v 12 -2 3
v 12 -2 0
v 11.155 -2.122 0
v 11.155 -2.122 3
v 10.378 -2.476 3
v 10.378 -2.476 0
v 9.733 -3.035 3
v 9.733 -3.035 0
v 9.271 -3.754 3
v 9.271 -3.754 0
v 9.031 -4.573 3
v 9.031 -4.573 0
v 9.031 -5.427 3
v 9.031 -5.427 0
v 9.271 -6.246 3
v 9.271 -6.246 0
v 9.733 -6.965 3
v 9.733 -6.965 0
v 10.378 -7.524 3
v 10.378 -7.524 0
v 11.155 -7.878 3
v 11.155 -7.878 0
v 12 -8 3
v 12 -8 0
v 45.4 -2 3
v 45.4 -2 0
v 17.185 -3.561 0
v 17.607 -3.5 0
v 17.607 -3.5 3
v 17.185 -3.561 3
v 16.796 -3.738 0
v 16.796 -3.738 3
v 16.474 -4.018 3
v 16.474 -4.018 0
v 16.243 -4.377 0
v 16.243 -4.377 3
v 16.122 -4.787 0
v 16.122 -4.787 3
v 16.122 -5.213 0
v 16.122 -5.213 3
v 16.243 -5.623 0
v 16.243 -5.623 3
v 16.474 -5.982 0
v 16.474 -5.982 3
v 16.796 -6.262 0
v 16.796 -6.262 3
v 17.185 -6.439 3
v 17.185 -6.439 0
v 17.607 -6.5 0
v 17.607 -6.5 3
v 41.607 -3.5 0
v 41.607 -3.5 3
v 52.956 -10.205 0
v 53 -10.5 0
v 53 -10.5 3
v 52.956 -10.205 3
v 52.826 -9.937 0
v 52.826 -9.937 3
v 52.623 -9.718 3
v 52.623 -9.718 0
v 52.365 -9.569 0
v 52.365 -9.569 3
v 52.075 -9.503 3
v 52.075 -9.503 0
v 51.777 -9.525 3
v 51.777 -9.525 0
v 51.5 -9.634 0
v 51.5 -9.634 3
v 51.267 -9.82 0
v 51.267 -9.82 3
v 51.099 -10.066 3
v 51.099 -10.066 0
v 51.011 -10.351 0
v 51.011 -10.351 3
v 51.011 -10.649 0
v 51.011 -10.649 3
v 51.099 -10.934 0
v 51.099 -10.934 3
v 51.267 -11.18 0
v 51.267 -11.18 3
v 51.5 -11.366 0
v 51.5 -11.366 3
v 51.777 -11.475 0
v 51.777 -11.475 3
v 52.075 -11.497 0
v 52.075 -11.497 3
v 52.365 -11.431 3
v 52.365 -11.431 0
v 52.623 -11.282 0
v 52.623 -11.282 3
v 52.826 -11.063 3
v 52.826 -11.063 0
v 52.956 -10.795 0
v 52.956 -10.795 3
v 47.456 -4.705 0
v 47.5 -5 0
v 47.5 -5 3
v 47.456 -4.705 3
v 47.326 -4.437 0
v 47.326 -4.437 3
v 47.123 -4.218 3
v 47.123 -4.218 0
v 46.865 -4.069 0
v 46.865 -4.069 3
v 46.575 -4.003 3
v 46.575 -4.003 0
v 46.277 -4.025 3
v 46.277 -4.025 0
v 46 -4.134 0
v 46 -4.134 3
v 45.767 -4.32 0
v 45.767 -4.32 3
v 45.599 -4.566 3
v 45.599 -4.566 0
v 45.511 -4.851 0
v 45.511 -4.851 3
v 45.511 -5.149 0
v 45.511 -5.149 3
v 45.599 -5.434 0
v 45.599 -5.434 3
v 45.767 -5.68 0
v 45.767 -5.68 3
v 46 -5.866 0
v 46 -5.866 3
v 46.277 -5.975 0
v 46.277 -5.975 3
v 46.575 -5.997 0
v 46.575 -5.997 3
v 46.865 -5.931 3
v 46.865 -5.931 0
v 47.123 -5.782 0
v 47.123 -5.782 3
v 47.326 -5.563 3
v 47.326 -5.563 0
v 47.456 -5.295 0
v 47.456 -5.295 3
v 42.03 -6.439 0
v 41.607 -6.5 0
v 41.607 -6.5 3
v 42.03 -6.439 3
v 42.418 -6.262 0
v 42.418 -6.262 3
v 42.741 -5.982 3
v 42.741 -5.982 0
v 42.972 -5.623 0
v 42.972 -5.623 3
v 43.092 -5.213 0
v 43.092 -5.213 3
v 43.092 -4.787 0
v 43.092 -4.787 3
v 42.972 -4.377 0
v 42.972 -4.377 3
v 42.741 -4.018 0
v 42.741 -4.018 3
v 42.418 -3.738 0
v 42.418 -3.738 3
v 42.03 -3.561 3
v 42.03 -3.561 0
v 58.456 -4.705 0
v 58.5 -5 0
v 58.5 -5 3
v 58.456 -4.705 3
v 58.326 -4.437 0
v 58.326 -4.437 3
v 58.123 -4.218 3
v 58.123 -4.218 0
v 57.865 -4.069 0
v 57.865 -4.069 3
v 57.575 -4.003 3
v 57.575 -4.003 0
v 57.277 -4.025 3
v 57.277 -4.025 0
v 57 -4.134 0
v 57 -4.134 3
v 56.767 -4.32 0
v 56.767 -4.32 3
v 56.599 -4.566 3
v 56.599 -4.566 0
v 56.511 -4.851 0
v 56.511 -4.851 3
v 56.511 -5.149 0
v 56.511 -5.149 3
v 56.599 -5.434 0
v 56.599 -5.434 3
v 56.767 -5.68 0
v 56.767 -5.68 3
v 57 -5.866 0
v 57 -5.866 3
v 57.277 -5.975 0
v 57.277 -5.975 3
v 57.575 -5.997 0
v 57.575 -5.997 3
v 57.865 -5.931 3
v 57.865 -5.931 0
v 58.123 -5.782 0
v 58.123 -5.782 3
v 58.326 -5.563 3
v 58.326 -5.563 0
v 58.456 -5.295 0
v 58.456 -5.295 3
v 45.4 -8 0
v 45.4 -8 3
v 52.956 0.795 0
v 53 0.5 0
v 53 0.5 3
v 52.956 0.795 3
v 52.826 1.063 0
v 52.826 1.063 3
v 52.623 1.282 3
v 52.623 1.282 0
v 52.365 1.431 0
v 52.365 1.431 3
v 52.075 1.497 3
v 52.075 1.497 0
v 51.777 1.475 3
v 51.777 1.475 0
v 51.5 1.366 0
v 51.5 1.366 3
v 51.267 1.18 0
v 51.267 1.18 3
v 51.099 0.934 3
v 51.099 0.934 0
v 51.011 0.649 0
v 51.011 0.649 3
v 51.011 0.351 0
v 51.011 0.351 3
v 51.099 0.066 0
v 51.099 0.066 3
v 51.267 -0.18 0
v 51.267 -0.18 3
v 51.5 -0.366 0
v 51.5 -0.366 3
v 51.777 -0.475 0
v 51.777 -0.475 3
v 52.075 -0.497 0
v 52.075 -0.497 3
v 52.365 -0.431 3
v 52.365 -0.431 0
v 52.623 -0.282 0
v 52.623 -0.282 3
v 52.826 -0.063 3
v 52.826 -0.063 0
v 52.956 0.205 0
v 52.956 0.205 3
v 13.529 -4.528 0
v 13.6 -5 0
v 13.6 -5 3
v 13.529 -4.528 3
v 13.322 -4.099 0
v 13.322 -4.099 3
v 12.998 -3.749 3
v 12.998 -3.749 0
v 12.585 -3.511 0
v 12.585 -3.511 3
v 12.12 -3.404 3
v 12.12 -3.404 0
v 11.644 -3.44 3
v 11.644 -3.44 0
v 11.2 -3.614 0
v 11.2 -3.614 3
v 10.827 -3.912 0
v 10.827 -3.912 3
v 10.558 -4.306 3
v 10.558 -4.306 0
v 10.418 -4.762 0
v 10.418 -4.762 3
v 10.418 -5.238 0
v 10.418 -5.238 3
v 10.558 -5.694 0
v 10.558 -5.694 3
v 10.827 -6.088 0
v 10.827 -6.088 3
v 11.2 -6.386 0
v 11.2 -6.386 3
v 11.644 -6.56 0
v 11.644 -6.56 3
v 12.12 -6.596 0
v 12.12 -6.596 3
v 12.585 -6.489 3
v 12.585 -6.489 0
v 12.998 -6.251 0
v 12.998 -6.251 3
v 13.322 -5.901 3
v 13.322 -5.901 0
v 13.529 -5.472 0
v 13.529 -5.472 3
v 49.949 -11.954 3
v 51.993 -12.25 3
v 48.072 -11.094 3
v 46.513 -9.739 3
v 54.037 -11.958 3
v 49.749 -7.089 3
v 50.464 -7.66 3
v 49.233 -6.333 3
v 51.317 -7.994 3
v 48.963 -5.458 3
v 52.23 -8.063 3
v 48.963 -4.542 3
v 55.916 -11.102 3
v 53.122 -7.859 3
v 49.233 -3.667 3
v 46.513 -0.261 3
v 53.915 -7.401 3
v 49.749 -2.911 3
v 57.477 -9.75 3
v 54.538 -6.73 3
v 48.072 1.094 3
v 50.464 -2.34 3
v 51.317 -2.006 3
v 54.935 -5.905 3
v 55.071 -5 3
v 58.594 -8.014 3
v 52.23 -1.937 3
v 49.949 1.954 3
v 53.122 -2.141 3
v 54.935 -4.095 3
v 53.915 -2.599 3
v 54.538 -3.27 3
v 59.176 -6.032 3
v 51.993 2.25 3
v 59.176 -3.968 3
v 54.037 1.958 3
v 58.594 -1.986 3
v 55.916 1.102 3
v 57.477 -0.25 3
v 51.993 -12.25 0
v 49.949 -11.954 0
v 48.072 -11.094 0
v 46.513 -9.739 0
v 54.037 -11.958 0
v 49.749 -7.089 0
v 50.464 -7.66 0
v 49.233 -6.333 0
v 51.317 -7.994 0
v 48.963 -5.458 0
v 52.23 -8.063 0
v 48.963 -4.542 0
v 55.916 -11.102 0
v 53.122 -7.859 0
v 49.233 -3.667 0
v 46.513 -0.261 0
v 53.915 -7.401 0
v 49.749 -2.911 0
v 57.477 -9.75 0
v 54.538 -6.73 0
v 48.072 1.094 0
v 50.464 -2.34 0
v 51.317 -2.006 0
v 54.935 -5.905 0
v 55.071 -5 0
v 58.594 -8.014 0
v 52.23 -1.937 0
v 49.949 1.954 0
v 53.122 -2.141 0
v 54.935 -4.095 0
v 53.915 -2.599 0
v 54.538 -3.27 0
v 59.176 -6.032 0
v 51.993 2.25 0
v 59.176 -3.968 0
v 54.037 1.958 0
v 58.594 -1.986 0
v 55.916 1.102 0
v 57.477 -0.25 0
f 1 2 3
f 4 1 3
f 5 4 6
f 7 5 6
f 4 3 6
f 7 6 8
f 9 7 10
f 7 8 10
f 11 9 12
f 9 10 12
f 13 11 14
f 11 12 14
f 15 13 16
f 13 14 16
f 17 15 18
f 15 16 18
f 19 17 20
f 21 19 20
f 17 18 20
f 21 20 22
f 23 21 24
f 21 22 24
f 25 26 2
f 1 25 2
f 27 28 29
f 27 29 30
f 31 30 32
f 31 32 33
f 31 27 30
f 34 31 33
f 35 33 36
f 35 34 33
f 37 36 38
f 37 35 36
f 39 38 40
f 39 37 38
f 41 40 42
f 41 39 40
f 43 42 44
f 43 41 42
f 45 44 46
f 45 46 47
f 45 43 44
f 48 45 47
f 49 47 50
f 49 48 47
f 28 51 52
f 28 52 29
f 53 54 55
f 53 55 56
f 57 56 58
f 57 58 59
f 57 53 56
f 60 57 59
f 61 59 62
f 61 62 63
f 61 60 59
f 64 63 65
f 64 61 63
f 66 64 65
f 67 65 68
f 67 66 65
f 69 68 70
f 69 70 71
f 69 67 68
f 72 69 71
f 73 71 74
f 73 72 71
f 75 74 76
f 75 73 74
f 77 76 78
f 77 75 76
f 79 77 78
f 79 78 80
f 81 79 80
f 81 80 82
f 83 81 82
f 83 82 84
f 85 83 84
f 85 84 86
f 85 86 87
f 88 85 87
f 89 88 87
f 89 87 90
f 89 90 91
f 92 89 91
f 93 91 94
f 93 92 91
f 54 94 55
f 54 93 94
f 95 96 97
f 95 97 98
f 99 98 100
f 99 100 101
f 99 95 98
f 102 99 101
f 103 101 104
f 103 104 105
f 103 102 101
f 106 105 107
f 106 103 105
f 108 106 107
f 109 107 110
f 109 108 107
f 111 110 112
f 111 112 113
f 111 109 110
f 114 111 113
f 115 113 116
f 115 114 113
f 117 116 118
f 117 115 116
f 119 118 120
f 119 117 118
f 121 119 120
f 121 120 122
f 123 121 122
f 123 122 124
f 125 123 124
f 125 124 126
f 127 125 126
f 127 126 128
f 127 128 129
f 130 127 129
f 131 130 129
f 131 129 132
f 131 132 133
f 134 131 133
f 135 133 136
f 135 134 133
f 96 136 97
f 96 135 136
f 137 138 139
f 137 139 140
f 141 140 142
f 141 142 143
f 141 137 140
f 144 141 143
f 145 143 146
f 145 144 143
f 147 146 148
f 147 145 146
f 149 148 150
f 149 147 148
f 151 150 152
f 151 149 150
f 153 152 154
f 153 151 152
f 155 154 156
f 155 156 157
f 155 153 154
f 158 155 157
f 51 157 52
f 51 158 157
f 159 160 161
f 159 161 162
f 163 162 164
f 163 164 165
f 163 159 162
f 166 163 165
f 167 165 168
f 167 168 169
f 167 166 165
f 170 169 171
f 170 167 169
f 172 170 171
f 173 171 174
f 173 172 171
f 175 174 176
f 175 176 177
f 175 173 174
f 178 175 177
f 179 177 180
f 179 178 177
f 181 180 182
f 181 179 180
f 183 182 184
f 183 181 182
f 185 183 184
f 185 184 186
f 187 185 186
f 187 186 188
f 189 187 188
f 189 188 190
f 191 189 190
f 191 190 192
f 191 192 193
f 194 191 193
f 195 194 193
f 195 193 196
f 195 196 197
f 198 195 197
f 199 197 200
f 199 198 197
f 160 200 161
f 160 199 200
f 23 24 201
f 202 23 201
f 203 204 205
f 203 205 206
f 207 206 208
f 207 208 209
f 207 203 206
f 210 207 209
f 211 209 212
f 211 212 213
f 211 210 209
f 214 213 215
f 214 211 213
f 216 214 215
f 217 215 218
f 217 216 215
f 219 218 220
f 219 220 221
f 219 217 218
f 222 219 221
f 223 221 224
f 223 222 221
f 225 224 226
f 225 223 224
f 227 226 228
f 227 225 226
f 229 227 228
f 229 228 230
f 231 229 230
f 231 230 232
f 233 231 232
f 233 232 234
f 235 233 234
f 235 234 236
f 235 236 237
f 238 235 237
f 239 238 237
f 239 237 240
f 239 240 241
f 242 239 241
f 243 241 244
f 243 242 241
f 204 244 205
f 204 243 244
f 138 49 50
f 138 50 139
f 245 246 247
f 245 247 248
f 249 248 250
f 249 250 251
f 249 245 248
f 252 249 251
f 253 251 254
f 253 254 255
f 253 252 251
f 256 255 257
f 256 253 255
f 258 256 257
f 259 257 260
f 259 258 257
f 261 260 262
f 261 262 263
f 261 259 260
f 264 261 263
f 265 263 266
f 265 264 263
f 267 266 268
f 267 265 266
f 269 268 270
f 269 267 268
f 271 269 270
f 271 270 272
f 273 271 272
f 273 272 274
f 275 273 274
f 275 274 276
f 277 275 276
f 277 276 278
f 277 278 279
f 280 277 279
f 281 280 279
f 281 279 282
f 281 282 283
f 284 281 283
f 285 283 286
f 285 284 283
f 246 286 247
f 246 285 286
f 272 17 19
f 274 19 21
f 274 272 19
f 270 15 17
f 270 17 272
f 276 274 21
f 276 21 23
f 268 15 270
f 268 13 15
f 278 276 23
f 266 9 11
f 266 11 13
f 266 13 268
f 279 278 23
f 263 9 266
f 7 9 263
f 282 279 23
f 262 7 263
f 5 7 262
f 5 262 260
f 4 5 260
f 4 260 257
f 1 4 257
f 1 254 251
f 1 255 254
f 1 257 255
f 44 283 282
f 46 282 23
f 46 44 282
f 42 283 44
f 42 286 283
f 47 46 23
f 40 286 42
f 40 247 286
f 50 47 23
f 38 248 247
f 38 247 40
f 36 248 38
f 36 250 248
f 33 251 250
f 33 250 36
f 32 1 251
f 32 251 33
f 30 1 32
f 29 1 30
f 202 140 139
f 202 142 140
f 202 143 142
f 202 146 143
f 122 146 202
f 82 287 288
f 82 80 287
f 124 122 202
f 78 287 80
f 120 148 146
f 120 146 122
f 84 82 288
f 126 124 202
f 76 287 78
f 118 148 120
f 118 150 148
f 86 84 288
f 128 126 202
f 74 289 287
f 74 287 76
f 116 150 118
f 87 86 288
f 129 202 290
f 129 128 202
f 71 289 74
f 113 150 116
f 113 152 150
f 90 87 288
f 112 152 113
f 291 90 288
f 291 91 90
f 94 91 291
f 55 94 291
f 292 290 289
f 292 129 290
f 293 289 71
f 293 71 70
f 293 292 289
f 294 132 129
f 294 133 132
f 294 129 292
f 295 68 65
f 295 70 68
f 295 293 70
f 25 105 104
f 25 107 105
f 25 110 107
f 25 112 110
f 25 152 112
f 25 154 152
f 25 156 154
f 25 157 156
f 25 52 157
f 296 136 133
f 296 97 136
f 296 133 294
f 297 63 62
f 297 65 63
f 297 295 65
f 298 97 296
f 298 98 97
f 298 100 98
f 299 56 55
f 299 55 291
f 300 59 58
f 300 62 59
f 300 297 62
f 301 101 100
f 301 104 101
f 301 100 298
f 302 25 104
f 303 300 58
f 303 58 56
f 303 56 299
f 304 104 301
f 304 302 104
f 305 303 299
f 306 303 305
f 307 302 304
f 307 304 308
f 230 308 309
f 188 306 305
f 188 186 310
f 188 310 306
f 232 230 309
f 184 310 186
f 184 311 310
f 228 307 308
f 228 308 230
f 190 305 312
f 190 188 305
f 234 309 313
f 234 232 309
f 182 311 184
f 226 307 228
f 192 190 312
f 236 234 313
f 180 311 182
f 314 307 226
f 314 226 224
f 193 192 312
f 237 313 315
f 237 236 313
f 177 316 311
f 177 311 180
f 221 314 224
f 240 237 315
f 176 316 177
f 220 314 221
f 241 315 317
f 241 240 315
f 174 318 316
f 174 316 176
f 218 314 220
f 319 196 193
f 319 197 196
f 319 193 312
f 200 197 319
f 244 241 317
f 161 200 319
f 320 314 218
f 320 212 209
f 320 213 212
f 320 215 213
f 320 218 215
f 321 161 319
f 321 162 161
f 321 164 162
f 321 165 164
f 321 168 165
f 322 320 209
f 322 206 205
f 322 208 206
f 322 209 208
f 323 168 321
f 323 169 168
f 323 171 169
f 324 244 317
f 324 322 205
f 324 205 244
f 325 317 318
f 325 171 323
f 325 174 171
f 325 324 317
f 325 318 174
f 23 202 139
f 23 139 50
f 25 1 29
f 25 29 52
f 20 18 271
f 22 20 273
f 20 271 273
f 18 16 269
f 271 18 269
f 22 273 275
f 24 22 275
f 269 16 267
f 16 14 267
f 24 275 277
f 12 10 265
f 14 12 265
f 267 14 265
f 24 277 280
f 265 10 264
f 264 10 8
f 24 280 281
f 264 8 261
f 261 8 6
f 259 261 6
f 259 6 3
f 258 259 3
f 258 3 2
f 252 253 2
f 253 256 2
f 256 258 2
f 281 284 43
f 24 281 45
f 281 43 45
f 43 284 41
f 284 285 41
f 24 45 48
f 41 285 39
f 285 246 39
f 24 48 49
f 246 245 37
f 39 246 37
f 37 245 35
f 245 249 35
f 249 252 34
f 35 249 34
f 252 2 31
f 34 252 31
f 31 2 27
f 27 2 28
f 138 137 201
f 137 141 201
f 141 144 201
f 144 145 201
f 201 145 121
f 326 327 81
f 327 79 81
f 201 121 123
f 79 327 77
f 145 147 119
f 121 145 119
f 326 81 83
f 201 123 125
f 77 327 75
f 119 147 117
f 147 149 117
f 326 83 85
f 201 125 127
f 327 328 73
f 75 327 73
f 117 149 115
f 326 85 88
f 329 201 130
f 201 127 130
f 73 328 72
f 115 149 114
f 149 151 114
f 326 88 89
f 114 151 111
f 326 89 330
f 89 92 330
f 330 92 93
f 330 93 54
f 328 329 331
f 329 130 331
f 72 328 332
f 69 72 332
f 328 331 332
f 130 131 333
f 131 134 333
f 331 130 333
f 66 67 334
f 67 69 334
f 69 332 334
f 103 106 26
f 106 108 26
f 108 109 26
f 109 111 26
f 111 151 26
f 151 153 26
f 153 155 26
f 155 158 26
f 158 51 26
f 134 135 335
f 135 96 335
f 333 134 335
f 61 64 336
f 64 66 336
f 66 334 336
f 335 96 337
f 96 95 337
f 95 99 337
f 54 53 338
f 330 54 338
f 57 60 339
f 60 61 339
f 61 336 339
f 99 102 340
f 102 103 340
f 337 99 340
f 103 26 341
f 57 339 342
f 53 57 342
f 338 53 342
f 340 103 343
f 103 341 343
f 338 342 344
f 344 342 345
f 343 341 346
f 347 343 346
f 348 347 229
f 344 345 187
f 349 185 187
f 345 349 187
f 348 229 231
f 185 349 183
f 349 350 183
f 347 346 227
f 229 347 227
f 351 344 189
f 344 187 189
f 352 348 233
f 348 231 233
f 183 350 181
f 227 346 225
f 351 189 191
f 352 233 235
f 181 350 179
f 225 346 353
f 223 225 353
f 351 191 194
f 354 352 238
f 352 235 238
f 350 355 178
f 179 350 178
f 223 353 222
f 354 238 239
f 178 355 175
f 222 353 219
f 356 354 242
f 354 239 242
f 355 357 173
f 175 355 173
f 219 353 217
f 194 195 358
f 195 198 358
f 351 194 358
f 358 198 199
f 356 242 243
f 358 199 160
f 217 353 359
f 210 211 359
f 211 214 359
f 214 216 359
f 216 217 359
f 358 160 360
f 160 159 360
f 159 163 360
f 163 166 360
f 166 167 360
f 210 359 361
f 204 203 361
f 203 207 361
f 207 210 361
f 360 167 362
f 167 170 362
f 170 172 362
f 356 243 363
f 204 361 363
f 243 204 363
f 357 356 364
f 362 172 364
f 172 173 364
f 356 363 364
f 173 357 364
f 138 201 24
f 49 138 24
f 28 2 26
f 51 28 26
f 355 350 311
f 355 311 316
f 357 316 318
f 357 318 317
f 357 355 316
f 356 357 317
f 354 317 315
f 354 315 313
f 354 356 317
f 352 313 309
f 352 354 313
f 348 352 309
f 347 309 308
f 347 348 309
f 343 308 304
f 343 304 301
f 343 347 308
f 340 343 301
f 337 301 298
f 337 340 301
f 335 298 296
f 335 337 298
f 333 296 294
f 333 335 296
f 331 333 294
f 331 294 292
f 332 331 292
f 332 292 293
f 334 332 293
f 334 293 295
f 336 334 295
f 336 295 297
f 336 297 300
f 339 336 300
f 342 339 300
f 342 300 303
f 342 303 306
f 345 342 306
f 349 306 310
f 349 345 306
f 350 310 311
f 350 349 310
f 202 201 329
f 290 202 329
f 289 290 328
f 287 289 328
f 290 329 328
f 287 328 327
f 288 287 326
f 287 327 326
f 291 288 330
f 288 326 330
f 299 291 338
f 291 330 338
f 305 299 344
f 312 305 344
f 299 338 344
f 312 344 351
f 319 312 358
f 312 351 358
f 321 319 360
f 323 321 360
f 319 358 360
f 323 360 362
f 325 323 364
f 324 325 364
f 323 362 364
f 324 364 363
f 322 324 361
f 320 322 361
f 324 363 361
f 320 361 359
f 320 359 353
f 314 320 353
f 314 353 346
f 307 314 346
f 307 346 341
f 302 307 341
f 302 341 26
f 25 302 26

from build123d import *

# Parameters (mm, degrees)
SKETCH_1_R      = 1
SKETCH_1_R_2    = 1.6
SKETCH_1_R_3    = 3.071217349
EXTRUDE_2_DEPTH = 3


with BuildPart() as part:
    # 草图1 → 凸台-拉伸2 (new body)
    with BuildSketch(Plane.XY):
        with BuildLine():
            Line((12, -8), (45.399810609, -8))
            ThreePointArc((45.399810609, -8), (59.25, -5), (45.399810609, -2))
            Line((45.399810609, -2), (12, -2))
            ThreePointArc((12, -2), (9, -5), (12, -8))
        make_face()
        with Locations((52, 0.5)):
            Circle(SKETCH_1_R, mode=Mode.SUBTRACT)
        with Locations((52, -10.5)):
            Circle(SKETCH_1_R, mode=Mode.SUBTRACT)
        with Locations((12, -5)):
            Circle(SKETCH_1_R_2, mode=Mode.SUBTRACT)
        with Locations((52, -5)):
            Circle(SKETCH_1_R_3, mode=Mode.SUBTRACT)
        with Locations((57.5, -5)):
            Circle(SKETCH_1_R, mode=Mode.SUBTRACT)
        with Locations((46.5, -5)):
            Circle(SKETCH_1_R, mode=Mode.SUBTRACT)
        with BuildLine():
            ThreePointArc((41.607192878, -6.5), (43.107192878, -5), (41.607192878, -3.5))
            Line((41.607192878, -3.5), (17.607192878, -3.5))
            ThreePointArc((17.607192878, -3.5), (16.107192878, -5), (17.607192878, -6.5))
            Line((17.607192878, -6.5), (41.607192878, -6.5))
        make_face(mode=Mode.SUBTRACT)
    extrude(amount=EXTRUDE_2_DEPTH)


solid = part.part
